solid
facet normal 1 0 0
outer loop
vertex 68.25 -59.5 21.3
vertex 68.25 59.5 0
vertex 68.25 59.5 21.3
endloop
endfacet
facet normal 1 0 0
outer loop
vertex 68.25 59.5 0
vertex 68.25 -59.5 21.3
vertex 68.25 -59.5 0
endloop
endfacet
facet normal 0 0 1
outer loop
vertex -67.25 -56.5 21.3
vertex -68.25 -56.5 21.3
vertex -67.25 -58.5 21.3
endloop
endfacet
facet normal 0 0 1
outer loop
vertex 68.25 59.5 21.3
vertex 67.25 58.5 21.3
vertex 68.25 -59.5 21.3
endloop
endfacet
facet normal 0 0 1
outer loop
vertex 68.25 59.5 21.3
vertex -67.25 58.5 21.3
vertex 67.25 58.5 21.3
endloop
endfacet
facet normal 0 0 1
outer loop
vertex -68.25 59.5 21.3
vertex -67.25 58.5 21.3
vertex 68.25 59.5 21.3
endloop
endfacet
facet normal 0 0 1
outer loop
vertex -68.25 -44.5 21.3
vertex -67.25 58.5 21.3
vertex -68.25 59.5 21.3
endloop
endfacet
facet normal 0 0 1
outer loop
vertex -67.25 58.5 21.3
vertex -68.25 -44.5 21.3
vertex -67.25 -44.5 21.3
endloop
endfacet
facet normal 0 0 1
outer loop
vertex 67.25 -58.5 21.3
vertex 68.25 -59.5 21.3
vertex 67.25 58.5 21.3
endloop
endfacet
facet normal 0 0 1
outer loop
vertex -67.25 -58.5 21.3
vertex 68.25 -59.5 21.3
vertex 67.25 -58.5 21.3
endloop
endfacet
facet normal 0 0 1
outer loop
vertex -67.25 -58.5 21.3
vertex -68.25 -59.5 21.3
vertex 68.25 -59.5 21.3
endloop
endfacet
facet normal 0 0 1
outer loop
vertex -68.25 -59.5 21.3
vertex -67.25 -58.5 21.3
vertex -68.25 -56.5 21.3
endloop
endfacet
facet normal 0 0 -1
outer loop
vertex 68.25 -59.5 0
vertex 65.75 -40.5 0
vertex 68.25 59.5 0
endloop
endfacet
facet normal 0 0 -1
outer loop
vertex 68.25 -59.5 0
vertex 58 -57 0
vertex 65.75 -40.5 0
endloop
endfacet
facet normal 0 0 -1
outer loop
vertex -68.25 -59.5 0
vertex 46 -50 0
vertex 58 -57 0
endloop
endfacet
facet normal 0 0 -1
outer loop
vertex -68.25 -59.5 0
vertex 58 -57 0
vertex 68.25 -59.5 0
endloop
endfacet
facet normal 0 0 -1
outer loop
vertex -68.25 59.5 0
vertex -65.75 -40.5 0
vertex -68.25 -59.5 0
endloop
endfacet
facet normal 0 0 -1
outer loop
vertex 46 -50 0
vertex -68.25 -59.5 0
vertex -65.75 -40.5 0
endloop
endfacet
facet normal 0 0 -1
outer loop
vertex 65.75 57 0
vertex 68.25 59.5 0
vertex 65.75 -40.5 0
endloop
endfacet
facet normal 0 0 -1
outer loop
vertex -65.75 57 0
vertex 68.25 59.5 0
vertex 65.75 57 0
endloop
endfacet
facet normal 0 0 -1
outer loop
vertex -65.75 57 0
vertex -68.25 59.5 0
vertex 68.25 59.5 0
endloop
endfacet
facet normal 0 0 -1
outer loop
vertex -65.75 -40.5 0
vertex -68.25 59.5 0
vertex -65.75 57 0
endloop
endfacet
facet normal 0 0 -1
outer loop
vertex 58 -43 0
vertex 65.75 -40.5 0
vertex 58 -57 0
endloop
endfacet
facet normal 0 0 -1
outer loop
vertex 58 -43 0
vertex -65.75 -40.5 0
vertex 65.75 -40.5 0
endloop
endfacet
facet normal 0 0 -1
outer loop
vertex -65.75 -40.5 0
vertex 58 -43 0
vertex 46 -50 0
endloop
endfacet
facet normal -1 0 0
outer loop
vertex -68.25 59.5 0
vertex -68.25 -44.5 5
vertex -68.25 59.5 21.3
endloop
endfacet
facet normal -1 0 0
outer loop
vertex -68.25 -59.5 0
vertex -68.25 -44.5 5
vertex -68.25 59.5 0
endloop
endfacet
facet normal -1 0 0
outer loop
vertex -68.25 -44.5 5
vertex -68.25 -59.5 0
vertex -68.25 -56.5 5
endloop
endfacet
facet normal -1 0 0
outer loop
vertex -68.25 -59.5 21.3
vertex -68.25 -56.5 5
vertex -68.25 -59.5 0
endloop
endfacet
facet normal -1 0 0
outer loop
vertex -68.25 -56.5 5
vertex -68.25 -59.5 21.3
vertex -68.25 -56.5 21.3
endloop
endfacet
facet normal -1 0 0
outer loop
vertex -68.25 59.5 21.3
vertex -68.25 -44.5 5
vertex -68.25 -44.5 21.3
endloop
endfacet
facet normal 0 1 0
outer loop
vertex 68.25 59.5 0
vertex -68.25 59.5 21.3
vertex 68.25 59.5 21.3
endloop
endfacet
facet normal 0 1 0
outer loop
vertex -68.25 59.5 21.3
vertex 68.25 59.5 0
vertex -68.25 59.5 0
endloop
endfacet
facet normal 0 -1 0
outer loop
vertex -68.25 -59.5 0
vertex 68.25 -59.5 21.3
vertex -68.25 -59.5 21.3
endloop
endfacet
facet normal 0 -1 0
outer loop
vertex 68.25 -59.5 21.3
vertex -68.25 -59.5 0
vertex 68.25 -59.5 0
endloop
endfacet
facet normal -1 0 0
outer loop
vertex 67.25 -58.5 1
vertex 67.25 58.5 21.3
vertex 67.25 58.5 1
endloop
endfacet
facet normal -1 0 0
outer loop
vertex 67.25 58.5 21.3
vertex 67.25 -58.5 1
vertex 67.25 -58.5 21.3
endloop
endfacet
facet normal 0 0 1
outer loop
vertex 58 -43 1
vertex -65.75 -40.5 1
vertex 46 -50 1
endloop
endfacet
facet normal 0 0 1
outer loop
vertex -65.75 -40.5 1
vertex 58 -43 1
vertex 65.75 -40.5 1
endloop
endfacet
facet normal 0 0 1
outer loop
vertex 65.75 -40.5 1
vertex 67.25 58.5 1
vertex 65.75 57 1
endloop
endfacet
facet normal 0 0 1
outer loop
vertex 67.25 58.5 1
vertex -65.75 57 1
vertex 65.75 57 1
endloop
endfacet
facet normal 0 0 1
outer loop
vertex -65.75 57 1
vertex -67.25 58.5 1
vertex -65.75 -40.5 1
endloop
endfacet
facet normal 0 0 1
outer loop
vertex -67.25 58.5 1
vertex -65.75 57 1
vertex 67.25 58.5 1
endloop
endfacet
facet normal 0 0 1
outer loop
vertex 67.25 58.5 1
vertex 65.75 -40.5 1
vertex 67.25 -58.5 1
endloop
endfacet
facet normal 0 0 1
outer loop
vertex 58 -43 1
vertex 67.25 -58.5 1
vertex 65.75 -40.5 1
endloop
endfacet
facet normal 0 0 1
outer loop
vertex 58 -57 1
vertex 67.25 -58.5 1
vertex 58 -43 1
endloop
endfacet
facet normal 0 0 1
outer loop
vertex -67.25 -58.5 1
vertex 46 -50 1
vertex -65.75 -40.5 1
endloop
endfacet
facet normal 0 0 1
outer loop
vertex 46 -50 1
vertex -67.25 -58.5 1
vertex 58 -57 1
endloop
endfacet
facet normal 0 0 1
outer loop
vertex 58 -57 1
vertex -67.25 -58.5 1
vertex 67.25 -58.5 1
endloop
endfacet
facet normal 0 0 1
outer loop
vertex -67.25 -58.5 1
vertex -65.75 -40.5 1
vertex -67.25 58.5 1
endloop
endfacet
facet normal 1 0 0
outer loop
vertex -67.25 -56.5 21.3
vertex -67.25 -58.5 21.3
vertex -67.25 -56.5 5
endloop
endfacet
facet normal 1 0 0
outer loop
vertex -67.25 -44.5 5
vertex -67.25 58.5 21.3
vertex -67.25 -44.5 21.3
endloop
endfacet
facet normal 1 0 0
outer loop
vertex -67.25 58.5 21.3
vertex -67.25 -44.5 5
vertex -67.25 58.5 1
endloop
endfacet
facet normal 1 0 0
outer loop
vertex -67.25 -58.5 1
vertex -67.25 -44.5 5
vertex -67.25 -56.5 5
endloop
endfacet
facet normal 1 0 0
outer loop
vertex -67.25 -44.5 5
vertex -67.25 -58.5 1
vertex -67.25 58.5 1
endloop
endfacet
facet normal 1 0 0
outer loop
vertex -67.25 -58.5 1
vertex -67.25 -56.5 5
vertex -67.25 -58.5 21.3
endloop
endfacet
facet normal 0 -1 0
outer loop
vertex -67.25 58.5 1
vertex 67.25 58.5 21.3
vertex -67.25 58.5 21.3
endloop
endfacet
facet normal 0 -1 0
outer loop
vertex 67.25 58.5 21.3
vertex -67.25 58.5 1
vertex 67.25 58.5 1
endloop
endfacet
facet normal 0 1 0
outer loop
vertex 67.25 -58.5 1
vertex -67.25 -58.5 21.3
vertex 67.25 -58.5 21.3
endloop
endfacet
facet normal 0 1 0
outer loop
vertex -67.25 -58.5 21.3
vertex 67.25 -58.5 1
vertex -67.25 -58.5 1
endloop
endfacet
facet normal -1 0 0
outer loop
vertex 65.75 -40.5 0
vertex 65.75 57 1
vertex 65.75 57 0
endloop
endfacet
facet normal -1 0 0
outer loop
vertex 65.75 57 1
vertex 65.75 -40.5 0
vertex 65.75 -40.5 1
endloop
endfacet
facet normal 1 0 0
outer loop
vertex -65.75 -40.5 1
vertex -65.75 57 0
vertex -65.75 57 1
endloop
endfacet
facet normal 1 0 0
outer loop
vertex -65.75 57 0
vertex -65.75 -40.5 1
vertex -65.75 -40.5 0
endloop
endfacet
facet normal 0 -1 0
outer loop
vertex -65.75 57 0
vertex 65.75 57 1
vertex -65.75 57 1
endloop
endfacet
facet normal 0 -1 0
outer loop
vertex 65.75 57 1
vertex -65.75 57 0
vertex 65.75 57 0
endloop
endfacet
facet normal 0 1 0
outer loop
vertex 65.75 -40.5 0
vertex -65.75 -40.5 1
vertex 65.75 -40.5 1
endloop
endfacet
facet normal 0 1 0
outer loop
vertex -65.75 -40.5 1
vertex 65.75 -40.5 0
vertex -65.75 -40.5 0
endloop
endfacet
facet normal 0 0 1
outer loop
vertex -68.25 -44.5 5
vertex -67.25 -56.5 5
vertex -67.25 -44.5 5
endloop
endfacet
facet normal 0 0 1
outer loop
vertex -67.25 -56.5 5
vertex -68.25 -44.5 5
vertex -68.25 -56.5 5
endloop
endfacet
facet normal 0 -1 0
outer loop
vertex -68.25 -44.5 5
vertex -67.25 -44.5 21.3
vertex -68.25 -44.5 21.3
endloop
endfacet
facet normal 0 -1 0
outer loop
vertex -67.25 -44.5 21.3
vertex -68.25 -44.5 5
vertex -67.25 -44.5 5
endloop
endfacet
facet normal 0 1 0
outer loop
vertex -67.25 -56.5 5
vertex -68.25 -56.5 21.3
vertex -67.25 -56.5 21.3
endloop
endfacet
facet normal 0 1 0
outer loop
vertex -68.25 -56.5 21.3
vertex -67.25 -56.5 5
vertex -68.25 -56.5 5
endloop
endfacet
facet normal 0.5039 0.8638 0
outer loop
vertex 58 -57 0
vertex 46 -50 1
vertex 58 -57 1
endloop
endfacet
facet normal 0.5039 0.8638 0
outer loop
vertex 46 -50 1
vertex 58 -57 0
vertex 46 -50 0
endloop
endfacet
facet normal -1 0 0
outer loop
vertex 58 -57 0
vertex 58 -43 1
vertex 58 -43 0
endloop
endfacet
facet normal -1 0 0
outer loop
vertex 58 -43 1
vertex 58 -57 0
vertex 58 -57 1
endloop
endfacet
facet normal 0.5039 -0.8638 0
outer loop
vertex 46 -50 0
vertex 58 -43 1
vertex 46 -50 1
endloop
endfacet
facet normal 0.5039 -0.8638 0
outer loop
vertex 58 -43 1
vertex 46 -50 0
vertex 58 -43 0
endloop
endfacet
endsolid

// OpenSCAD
$fn=64;


inner_width = 134.5;
inner_height = 117;
inner_depth = 20.3;

wall = 1;

outer_width = inner_width + wall * 2;
outer_height = inner_height + wall * 2;
outer_depth = inner_depth + wall;
border = 1.5;

screen_height = 99;

lineout_cutoff_height = 12;
lineout_cutoff_inner_offset = 2.5;
lineout_cutoff_y_offset = 4;

difference()
{
    translate([0, 0, outer_depth / 2])
        cube([outer_width, outer_height, outer_depth], center = true);
    
    translate([0, 0, outer_depth / 2 + wall])
        cube([inner_width, inner_height, outer_depth], center = true);
    
    translate([0, (inner_height - screen_height) / 2 - border / 2, 0])
        cube([inner_width - border * 2, screen_height - border, outer_depth], center = true);
    
    translate([-outer_width / 2, -inner_height / 2 + lineout_cutoff_height / 2 + lineout_cutoff_inner_offset -0.5, wall + outer_depth /2 + lineout_cutoff_y_offset])
        cube([wall * 4, lineout_cutoff_height, outer_depth], center = true);

    translate([58, -50, -wall])
        linear_extrude(wall * 3)
            polygon([[-12, 0], [0, -7], [0, 7]]);
}
